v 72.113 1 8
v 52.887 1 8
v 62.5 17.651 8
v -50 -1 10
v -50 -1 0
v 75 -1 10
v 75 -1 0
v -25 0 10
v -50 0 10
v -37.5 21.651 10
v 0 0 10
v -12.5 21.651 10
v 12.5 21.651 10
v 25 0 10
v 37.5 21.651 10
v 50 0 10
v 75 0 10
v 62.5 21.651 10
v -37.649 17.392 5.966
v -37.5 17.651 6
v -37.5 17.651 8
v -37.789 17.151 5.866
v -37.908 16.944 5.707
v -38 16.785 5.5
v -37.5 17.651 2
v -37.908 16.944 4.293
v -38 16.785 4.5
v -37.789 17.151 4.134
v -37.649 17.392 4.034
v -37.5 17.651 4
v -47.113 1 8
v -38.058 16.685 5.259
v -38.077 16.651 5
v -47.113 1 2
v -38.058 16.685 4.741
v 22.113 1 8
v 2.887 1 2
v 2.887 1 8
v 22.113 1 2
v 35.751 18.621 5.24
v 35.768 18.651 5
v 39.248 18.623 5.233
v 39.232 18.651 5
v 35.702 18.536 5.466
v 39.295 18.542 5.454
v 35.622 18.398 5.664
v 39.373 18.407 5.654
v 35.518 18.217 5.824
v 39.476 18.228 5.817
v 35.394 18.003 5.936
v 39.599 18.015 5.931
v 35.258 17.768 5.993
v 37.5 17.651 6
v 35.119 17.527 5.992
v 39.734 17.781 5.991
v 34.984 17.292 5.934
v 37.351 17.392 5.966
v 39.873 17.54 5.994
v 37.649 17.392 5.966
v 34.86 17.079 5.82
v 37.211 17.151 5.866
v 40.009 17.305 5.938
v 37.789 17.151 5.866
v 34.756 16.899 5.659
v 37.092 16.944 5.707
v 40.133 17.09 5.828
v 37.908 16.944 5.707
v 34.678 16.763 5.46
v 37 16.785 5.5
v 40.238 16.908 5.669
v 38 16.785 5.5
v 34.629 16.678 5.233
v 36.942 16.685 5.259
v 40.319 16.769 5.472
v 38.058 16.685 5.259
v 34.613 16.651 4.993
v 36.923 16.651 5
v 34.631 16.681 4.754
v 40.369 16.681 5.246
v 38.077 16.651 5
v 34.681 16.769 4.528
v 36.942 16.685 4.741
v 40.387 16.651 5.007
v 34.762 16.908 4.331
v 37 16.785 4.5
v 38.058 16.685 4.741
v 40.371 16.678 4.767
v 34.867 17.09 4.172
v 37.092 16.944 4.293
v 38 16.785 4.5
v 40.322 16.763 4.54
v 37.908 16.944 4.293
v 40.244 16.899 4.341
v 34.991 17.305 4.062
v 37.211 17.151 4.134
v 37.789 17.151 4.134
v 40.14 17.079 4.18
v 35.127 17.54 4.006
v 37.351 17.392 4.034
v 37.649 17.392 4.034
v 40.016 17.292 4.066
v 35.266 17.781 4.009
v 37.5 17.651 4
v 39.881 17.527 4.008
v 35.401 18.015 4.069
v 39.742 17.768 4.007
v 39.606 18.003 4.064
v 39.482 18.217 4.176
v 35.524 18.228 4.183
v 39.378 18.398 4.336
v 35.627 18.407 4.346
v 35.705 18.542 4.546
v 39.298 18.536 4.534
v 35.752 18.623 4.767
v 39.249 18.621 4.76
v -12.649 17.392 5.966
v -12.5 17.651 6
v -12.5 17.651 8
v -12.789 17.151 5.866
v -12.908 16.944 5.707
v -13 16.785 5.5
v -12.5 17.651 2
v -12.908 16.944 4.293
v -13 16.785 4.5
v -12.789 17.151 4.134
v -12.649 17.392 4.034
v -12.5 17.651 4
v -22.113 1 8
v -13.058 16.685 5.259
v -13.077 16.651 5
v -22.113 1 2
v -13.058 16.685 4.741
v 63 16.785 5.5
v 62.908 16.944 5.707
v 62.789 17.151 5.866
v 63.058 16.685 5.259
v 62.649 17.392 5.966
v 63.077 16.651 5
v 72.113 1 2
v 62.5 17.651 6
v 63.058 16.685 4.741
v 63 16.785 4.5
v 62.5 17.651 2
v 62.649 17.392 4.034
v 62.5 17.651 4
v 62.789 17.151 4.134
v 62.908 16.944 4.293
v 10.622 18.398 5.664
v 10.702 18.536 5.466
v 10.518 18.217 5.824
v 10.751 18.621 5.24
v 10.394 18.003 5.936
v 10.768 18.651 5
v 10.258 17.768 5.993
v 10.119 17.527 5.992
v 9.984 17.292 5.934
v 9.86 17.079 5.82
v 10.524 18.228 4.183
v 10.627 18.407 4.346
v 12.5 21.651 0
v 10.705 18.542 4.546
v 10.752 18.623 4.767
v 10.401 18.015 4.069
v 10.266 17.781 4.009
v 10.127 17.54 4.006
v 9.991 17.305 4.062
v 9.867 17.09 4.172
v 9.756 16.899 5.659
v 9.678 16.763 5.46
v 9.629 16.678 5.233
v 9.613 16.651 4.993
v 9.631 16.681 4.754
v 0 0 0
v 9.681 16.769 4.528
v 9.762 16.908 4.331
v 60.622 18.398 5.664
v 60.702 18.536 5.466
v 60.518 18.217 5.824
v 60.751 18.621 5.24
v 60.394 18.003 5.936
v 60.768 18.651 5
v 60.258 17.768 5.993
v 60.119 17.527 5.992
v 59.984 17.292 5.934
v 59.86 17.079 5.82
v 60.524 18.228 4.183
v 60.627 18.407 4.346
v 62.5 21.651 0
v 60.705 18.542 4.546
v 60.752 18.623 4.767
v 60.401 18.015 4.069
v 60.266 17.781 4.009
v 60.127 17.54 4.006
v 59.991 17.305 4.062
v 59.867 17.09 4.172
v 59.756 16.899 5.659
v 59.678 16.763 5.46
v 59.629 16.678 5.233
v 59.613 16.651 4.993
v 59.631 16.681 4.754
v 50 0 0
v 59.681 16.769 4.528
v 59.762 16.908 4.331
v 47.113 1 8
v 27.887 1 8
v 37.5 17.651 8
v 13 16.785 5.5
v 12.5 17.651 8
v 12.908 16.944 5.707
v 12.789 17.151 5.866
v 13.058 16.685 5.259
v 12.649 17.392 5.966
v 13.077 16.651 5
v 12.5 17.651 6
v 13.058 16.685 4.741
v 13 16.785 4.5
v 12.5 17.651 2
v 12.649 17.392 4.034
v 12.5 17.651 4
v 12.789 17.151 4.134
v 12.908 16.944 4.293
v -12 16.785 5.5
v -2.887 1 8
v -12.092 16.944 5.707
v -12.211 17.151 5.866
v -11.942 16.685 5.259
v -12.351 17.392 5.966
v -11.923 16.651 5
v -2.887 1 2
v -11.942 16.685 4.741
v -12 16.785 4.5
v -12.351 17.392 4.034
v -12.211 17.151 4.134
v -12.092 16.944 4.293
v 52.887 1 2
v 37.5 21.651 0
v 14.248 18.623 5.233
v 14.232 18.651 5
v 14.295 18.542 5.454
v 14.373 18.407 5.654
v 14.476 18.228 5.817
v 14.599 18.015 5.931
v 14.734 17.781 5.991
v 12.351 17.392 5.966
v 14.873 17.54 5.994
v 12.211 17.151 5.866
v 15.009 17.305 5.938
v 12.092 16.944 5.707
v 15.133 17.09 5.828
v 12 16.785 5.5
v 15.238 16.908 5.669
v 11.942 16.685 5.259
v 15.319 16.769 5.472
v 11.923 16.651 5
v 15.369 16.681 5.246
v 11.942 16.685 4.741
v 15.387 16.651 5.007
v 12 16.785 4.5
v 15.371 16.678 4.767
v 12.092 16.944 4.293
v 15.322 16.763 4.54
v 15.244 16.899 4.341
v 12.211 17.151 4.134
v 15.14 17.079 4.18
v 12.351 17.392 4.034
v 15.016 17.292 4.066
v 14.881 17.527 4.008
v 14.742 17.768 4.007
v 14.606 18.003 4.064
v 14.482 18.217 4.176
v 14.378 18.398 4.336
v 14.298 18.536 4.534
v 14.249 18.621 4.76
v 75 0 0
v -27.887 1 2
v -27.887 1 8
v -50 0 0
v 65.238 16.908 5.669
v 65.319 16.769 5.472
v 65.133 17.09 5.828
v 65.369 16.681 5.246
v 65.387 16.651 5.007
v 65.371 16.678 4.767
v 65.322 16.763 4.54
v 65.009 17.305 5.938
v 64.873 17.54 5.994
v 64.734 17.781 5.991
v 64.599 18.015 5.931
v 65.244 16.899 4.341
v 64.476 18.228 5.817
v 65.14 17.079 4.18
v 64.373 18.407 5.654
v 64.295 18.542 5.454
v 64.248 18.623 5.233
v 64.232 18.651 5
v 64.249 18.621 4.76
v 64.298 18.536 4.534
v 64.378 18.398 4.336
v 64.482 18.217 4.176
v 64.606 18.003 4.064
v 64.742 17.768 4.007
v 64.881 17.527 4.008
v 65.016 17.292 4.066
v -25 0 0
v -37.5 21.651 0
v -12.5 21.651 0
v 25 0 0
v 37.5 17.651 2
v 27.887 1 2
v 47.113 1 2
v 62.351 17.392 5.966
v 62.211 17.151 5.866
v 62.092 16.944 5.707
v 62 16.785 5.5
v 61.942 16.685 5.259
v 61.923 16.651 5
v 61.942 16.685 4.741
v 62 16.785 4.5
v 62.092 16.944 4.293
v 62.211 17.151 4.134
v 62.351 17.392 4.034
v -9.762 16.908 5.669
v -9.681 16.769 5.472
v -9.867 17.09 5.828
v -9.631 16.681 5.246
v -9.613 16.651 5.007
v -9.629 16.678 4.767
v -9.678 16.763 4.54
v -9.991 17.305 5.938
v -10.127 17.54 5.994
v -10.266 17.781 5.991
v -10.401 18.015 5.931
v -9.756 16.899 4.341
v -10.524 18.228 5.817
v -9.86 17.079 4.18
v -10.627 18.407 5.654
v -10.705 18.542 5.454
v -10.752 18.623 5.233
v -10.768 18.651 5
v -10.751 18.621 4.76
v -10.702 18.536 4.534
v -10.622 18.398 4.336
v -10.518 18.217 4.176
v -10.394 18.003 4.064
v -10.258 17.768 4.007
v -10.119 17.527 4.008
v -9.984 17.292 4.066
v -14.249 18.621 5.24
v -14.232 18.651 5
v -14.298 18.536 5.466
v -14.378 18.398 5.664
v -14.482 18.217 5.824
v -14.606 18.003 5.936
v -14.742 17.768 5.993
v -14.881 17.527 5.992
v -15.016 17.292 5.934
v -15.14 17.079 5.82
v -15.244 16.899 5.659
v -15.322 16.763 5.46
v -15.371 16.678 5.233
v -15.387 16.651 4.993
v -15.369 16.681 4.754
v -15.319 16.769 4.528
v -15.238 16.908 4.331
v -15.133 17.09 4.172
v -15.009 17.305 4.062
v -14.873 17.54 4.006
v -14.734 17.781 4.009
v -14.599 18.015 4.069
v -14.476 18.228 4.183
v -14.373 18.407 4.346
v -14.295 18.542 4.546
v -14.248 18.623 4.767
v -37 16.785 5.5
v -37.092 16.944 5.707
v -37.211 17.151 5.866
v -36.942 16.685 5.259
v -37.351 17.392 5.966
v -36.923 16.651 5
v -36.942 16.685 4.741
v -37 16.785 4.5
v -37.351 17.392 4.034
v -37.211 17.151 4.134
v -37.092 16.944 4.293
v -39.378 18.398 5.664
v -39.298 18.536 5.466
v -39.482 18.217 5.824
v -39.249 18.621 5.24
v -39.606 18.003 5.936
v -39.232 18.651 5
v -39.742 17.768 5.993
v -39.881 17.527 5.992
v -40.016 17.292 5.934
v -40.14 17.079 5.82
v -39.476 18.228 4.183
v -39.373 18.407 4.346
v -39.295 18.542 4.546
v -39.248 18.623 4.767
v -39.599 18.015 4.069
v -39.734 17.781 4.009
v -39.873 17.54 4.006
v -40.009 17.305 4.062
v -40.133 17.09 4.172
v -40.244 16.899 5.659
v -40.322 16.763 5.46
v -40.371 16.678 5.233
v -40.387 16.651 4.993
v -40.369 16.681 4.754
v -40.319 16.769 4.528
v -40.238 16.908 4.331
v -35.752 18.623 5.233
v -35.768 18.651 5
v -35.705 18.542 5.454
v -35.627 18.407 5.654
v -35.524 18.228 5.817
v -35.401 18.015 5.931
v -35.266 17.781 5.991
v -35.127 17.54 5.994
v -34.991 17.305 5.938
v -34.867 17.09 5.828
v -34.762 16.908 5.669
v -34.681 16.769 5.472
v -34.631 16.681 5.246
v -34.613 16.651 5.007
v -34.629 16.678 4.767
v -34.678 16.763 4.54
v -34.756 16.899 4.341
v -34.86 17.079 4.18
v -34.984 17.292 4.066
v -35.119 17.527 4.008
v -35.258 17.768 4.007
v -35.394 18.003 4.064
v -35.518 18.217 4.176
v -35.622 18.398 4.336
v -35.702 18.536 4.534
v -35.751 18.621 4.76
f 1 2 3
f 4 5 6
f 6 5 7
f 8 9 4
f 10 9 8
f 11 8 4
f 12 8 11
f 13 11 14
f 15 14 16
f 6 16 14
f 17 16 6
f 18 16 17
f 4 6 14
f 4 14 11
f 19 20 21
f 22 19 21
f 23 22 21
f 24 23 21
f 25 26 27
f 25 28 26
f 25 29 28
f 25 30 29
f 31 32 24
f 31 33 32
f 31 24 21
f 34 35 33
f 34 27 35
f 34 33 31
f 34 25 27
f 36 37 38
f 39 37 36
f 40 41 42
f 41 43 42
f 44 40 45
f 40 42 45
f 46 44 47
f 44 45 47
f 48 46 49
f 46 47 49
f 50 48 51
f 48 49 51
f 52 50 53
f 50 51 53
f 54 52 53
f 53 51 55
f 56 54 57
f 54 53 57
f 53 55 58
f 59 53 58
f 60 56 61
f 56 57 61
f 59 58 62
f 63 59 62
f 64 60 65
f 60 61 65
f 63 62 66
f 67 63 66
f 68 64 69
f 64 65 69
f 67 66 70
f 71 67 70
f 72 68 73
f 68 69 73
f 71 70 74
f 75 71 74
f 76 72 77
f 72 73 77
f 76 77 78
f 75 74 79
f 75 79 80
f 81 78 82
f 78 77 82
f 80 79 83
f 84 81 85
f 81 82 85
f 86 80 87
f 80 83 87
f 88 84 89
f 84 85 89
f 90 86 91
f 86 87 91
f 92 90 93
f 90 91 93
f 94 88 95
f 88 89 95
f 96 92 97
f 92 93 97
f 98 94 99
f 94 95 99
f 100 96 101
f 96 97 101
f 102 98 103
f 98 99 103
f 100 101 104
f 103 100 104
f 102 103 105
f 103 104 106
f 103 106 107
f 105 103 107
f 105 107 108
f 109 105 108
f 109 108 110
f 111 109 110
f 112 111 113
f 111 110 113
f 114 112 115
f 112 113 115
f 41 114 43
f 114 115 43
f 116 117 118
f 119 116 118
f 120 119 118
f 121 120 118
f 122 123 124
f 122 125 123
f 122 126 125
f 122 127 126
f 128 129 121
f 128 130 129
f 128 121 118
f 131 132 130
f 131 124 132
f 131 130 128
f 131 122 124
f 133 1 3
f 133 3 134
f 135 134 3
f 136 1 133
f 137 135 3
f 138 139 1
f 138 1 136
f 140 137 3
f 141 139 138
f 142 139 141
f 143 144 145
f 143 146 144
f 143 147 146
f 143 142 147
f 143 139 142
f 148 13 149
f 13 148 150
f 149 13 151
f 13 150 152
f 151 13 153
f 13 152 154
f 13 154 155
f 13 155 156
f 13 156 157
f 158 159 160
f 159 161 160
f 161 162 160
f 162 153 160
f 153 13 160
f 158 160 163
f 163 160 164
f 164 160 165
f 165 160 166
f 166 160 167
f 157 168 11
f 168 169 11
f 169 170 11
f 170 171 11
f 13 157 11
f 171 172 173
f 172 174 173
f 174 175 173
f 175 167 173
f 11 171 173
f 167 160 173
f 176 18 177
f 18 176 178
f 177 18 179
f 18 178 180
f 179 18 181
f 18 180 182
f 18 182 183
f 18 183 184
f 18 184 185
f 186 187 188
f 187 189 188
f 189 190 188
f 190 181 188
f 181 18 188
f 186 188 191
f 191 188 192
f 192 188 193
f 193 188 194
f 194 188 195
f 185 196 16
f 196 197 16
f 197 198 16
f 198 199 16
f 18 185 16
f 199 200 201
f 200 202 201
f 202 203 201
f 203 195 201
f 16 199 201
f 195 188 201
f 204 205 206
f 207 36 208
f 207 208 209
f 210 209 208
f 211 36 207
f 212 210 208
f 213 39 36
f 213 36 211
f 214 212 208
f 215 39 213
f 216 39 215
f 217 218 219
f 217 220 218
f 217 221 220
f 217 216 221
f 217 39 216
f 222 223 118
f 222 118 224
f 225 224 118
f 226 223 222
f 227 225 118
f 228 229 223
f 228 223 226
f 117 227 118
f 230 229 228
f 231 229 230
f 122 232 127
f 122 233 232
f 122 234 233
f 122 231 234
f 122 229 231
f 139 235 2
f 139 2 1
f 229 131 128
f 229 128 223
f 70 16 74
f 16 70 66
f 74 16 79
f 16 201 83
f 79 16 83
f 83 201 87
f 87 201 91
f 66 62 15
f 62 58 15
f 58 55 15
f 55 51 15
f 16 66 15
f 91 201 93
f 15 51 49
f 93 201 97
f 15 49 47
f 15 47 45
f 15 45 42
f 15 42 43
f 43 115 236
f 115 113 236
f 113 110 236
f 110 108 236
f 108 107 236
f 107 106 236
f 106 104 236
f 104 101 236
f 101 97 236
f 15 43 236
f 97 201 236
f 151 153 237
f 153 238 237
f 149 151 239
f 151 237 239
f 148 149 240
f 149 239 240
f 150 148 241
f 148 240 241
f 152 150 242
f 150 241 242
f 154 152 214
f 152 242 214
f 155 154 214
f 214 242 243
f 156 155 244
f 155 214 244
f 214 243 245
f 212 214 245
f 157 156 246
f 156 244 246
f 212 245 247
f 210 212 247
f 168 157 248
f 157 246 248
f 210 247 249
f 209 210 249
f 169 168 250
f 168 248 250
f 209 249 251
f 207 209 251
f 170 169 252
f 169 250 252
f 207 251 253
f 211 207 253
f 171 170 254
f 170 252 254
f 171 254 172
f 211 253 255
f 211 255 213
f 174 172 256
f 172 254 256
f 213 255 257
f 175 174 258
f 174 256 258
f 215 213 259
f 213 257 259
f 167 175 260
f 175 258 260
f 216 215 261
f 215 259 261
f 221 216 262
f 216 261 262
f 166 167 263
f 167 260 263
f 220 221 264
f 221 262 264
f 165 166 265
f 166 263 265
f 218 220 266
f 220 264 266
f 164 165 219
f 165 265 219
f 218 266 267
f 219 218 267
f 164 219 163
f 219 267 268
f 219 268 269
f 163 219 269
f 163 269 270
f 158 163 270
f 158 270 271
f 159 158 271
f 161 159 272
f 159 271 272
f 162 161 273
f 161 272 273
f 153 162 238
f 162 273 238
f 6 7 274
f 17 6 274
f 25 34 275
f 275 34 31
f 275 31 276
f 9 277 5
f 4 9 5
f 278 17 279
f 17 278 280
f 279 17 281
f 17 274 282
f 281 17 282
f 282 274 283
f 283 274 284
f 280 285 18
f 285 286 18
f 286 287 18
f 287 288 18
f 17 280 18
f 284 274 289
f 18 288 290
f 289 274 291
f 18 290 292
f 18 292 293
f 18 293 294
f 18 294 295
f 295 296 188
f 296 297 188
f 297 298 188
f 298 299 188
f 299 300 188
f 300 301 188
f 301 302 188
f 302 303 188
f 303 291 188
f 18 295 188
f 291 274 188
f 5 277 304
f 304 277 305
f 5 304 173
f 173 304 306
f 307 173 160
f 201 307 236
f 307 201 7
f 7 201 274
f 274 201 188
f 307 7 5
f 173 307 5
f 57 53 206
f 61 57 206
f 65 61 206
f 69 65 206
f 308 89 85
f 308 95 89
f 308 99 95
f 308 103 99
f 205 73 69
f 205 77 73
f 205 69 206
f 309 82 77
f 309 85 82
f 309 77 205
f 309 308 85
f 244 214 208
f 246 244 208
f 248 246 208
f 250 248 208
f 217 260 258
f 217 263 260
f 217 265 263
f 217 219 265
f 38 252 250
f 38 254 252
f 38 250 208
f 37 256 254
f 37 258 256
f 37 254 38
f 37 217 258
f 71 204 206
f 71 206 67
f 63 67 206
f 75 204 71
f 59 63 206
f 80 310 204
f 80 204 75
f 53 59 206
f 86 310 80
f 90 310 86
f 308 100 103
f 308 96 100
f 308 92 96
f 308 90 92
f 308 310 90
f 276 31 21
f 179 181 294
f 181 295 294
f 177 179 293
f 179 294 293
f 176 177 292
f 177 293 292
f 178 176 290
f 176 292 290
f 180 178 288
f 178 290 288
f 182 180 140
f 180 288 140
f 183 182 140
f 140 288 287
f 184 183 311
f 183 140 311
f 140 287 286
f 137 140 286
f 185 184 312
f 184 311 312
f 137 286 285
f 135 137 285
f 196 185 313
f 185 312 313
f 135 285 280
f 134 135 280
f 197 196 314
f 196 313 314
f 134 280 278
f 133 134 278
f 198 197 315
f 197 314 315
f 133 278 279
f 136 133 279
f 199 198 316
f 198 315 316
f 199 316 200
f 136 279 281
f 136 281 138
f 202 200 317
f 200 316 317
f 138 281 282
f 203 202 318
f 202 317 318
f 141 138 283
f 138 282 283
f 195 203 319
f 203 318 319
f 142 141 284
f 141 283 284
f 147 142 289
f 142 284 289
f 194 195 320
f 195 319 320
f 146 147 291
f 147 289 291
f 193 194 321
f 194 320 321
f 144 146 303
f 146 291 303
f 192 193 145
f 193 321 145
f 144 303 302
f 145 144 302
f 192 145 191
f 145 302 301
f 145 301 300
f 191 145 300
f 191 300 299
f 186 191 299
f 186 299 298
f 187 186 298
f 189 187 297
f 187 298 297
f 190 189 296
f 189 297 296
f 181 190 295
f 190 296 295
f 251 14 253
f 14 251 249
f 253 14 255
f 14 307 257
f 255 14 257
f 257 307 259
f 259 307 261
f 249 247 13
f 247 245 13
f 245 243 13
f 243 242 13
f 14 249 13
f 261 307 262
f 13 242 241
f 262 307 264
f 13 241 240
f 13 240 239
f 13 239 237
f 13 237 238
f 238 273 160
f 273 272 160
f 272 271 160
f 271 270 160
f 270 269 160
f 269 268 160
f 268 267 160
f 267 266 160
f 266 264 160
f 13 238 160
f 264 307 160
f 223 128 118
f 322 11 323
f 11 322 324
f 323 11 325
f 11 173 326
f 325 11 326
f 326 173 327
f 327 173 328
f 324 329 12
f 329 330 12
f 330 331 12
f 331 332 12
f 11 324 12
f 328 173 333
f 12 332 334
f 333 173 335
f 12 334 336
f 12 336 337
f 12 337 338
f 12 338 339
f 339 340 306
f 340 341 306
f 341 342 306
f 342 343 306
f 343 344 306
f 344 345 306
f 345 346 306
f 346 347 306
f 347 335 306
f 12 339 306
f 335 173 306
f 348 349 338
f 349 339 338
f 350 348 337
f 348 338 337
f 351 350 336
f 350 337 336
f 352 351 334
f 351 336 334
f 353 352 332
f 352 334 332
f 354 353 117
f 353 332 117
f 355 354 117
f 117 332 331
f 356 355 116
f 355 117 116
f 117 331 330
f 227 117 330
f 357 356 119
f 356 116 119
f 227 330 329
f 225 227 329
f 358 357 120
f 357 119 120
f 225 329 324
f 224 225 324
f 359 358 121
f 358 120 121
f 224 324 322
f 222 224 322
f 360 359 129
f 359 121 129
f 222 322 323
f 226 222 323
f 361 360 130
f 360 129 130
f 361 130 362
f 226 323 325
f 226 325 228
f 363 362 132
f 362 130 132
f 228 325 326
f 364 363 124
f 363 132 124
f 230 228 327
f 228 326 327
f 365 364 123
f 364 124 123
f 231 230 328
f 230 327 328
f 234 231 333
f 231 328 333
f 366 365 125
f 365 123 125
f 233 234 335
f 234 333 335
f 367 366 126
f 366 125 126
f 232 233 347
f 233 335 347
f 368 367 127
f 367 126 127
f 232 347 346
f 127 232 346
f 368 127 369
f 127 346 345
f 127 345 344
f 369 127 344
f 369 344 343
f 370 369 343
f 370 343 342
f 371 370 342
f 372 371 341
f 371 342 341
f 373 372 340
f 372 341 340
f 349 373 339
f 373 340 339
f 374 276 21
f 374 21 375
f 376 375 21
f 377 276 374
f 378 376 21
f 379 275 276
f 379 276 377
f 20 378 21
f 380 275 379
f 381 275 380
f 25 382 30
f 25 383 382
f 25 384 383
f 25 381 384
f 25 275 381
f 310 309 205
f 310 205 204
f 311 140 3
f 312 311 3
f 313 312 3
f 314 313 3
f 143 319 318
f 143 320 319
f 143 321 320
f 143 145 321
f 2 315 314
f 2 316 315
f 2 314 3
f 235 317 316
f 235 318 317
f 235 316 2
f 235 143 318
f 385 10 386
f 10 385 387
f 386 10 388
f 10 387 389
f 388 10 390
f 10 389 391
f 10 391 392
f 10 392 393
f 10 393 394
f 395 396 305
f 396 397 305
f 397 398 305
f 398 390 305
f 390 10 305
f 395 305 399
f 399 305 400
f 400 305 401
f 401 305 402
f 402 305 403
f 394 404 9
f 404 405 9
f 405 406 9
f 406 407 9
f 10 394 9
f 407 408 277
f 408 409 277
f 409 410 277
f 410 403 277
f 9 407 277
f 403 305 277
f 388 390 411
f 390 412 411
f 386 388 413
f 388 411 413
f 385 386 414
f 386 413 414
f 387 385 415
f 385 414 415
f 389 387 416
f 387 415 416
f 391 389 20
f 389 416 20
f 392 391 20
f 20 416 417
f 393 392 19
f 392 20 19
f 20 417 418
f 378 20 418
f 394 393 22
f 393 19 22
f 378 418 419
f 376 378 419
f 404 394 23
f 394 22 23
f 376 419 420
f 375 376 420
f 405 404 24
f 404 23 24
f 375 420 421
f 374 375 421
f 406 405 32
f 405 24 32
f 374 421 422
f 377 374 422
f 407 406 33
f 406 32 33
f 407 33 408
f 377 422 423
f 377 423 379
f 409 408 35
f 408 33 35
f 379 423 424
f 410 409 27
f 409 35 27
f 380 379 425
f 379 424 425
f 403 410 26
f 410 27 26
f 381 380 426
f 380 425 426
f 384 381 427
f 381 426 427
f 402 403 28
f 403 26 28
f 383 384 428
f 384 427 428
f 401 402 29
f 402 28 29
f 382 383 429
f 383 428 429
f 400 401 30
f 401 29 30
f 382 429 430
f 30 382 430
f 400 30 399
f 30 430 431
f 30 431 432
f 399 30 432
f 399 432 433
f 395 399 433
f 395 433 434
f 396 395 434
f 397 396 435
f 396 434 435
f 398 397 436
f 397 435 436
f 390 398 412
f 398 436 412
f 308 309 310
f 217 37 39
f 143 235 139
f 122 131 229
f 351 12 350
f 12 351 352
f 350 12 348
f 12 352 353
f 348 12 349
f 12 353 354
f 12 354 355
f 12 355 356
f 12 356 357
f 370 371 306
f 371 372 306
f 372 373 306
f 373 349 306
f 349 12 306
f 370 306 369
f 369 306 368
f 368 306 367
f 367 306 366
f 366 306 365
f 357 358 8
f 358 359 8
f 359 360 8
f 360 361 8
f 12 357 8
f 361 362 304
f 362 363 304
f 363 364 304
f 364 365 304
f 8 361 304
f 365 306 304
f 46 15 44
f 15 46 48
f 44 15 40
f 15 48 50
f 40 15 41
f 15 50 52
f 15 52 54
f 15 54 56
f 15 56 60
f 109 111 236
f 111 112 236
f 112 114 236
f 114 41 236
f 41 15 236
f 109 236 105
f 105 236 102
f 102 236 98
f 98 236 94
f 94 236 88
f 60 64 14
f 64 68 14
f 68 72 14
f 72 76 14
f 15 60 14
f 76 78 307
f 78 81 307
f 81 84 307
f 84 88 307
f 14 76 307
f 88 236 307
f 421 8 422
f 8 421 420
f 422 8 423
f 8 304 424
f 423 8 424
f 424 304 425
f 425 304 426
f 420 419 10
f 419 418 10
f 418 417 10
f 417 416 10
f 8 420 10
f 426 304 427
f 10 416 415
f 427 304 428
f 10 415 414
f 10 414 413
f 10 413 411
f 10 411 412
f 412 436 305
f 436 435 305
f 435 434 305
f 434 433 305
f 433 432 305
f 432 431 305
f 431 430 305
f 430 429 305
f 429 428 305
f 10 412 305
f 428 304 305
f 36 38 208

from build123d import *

# Parameters (mm, degrees)
F1_DEPTH    = 10
F2_T        = 2
F2_T3_DEPTH = 14
F3_R        = 1
F4_DEPTH    = 100


# Not quite as in the source:
# - a shell that OpenCascade refuses in one call is made with other operations: the cavity is built on its own and cut out


with BuildPart() as f1:
    # F0 (on Top) → F1 (new body)
    with BuildSketch(Plane.XY):
        Polygon((-50, 0), (-25, 0), (-37.5, 21.6506350946), align=None)
        Polygon((-12.5, 21.6506350946), (-25, 0), (0, 0), align=None)
        Polygon((12.5, 21.6506350946), (0, 0), (25, 0), align=None)
        Polygon((37.5, 21.6506350946), (25, 0), (50, 0), align=None)
        Polygon((62.5, 21.6506350946), (50, 0), (75, 0), align=None)
        Polygon((0, 0), (-25, 0), (-50, 0), (-50, -1), (75, -1), (75, 0), (50, 0), (25, 0), align=None)
    extrude(amount=F1_DEPTH)

    # F2: shell of thickness 2, made by hand


with BuildPart() as f2_core1:
    # F2_t2: copy of F1
    add(f1.part)

    # the walls: a layer under each face that stays
    f2_faces = [f2_core1.faces().sort_by_distance(p)[0] for p in [
        (-31.25, 10.8253175473, 5),
        (-43.75, 10.8253175473, 5),
        (-50, -0.5, 5),
        (12.5, -1, 5),
        (75, -0.5, 5),
        (68.75, 10.8253175473, 5),
        (56.25, 10.8253175473, 5),
        (43.75, 10.8253175473, 5),
        (31.25, 10.8253175473, 5),
        (18.75, 10.8253175473, 5),
        (6.25, 10.8253175473, 5),
        (-6.25, 10.8253175473, 5),
        (-18.75, 10.8253175473, 5),
        (12.5, 10.3253175473, 0),
        (12.5, 10.3253175473, 10),
    ]]
    thicken(f2_faces, amount=-F2_T, mode=Mode.SUBTRACT)

    # F2_s4 → F2_t3 (cut)
    with BuildSketch(Plane.XY.offset(-2)):
        Polygon((-25, 0.02), (-26.7320508076, -1), (-25, -4), (-23.2679491924, -1), align=None)
        Polygon((50, 0.02), (51.7320508076, -1), (50, -4), (48.2679491924, -1), align=None)
        Polygon((25, 0.02), (26.7320508076, -1), (25, -4), (23.2679491924, -1), align=None)
        Polygon((0, 0.02), (1.7320508076, -1), (0, -4), (-1.7320508076, -1), align=None)
    extrude(amount=F2_T3_DEPTH, mode=Mode.SUBTRACT)


with BuildPart() as f1_1:
    add(f1.part)

    # what is left inside the walls is the cavity
    f2_cavity = [f2_core1.part.solids().sort_by_distance(p)[0] for p in [
        (-37.5, 6.550212, 2.02),
        (-12.5, 6.550212, 2.02),
        (12.5, 6.550212, 2.02),
        (37.5, 6.550212, 2.02),
        (62.5, 6.550212, 2.02),
    ]]
    add(f2_cavity, mode=Mode.SUBTRACT)

    # F3 (on Right) → F4 (cut, symmetric)
    with BuildSketch(Plane.YZ):
        with Locations((17.6506350946, 5)):
            Circle(F3_R)
    extrude(amount=F4_DEPTH, both=True, mode=Mode.SUBTRACT)


solid = f1_1.part
